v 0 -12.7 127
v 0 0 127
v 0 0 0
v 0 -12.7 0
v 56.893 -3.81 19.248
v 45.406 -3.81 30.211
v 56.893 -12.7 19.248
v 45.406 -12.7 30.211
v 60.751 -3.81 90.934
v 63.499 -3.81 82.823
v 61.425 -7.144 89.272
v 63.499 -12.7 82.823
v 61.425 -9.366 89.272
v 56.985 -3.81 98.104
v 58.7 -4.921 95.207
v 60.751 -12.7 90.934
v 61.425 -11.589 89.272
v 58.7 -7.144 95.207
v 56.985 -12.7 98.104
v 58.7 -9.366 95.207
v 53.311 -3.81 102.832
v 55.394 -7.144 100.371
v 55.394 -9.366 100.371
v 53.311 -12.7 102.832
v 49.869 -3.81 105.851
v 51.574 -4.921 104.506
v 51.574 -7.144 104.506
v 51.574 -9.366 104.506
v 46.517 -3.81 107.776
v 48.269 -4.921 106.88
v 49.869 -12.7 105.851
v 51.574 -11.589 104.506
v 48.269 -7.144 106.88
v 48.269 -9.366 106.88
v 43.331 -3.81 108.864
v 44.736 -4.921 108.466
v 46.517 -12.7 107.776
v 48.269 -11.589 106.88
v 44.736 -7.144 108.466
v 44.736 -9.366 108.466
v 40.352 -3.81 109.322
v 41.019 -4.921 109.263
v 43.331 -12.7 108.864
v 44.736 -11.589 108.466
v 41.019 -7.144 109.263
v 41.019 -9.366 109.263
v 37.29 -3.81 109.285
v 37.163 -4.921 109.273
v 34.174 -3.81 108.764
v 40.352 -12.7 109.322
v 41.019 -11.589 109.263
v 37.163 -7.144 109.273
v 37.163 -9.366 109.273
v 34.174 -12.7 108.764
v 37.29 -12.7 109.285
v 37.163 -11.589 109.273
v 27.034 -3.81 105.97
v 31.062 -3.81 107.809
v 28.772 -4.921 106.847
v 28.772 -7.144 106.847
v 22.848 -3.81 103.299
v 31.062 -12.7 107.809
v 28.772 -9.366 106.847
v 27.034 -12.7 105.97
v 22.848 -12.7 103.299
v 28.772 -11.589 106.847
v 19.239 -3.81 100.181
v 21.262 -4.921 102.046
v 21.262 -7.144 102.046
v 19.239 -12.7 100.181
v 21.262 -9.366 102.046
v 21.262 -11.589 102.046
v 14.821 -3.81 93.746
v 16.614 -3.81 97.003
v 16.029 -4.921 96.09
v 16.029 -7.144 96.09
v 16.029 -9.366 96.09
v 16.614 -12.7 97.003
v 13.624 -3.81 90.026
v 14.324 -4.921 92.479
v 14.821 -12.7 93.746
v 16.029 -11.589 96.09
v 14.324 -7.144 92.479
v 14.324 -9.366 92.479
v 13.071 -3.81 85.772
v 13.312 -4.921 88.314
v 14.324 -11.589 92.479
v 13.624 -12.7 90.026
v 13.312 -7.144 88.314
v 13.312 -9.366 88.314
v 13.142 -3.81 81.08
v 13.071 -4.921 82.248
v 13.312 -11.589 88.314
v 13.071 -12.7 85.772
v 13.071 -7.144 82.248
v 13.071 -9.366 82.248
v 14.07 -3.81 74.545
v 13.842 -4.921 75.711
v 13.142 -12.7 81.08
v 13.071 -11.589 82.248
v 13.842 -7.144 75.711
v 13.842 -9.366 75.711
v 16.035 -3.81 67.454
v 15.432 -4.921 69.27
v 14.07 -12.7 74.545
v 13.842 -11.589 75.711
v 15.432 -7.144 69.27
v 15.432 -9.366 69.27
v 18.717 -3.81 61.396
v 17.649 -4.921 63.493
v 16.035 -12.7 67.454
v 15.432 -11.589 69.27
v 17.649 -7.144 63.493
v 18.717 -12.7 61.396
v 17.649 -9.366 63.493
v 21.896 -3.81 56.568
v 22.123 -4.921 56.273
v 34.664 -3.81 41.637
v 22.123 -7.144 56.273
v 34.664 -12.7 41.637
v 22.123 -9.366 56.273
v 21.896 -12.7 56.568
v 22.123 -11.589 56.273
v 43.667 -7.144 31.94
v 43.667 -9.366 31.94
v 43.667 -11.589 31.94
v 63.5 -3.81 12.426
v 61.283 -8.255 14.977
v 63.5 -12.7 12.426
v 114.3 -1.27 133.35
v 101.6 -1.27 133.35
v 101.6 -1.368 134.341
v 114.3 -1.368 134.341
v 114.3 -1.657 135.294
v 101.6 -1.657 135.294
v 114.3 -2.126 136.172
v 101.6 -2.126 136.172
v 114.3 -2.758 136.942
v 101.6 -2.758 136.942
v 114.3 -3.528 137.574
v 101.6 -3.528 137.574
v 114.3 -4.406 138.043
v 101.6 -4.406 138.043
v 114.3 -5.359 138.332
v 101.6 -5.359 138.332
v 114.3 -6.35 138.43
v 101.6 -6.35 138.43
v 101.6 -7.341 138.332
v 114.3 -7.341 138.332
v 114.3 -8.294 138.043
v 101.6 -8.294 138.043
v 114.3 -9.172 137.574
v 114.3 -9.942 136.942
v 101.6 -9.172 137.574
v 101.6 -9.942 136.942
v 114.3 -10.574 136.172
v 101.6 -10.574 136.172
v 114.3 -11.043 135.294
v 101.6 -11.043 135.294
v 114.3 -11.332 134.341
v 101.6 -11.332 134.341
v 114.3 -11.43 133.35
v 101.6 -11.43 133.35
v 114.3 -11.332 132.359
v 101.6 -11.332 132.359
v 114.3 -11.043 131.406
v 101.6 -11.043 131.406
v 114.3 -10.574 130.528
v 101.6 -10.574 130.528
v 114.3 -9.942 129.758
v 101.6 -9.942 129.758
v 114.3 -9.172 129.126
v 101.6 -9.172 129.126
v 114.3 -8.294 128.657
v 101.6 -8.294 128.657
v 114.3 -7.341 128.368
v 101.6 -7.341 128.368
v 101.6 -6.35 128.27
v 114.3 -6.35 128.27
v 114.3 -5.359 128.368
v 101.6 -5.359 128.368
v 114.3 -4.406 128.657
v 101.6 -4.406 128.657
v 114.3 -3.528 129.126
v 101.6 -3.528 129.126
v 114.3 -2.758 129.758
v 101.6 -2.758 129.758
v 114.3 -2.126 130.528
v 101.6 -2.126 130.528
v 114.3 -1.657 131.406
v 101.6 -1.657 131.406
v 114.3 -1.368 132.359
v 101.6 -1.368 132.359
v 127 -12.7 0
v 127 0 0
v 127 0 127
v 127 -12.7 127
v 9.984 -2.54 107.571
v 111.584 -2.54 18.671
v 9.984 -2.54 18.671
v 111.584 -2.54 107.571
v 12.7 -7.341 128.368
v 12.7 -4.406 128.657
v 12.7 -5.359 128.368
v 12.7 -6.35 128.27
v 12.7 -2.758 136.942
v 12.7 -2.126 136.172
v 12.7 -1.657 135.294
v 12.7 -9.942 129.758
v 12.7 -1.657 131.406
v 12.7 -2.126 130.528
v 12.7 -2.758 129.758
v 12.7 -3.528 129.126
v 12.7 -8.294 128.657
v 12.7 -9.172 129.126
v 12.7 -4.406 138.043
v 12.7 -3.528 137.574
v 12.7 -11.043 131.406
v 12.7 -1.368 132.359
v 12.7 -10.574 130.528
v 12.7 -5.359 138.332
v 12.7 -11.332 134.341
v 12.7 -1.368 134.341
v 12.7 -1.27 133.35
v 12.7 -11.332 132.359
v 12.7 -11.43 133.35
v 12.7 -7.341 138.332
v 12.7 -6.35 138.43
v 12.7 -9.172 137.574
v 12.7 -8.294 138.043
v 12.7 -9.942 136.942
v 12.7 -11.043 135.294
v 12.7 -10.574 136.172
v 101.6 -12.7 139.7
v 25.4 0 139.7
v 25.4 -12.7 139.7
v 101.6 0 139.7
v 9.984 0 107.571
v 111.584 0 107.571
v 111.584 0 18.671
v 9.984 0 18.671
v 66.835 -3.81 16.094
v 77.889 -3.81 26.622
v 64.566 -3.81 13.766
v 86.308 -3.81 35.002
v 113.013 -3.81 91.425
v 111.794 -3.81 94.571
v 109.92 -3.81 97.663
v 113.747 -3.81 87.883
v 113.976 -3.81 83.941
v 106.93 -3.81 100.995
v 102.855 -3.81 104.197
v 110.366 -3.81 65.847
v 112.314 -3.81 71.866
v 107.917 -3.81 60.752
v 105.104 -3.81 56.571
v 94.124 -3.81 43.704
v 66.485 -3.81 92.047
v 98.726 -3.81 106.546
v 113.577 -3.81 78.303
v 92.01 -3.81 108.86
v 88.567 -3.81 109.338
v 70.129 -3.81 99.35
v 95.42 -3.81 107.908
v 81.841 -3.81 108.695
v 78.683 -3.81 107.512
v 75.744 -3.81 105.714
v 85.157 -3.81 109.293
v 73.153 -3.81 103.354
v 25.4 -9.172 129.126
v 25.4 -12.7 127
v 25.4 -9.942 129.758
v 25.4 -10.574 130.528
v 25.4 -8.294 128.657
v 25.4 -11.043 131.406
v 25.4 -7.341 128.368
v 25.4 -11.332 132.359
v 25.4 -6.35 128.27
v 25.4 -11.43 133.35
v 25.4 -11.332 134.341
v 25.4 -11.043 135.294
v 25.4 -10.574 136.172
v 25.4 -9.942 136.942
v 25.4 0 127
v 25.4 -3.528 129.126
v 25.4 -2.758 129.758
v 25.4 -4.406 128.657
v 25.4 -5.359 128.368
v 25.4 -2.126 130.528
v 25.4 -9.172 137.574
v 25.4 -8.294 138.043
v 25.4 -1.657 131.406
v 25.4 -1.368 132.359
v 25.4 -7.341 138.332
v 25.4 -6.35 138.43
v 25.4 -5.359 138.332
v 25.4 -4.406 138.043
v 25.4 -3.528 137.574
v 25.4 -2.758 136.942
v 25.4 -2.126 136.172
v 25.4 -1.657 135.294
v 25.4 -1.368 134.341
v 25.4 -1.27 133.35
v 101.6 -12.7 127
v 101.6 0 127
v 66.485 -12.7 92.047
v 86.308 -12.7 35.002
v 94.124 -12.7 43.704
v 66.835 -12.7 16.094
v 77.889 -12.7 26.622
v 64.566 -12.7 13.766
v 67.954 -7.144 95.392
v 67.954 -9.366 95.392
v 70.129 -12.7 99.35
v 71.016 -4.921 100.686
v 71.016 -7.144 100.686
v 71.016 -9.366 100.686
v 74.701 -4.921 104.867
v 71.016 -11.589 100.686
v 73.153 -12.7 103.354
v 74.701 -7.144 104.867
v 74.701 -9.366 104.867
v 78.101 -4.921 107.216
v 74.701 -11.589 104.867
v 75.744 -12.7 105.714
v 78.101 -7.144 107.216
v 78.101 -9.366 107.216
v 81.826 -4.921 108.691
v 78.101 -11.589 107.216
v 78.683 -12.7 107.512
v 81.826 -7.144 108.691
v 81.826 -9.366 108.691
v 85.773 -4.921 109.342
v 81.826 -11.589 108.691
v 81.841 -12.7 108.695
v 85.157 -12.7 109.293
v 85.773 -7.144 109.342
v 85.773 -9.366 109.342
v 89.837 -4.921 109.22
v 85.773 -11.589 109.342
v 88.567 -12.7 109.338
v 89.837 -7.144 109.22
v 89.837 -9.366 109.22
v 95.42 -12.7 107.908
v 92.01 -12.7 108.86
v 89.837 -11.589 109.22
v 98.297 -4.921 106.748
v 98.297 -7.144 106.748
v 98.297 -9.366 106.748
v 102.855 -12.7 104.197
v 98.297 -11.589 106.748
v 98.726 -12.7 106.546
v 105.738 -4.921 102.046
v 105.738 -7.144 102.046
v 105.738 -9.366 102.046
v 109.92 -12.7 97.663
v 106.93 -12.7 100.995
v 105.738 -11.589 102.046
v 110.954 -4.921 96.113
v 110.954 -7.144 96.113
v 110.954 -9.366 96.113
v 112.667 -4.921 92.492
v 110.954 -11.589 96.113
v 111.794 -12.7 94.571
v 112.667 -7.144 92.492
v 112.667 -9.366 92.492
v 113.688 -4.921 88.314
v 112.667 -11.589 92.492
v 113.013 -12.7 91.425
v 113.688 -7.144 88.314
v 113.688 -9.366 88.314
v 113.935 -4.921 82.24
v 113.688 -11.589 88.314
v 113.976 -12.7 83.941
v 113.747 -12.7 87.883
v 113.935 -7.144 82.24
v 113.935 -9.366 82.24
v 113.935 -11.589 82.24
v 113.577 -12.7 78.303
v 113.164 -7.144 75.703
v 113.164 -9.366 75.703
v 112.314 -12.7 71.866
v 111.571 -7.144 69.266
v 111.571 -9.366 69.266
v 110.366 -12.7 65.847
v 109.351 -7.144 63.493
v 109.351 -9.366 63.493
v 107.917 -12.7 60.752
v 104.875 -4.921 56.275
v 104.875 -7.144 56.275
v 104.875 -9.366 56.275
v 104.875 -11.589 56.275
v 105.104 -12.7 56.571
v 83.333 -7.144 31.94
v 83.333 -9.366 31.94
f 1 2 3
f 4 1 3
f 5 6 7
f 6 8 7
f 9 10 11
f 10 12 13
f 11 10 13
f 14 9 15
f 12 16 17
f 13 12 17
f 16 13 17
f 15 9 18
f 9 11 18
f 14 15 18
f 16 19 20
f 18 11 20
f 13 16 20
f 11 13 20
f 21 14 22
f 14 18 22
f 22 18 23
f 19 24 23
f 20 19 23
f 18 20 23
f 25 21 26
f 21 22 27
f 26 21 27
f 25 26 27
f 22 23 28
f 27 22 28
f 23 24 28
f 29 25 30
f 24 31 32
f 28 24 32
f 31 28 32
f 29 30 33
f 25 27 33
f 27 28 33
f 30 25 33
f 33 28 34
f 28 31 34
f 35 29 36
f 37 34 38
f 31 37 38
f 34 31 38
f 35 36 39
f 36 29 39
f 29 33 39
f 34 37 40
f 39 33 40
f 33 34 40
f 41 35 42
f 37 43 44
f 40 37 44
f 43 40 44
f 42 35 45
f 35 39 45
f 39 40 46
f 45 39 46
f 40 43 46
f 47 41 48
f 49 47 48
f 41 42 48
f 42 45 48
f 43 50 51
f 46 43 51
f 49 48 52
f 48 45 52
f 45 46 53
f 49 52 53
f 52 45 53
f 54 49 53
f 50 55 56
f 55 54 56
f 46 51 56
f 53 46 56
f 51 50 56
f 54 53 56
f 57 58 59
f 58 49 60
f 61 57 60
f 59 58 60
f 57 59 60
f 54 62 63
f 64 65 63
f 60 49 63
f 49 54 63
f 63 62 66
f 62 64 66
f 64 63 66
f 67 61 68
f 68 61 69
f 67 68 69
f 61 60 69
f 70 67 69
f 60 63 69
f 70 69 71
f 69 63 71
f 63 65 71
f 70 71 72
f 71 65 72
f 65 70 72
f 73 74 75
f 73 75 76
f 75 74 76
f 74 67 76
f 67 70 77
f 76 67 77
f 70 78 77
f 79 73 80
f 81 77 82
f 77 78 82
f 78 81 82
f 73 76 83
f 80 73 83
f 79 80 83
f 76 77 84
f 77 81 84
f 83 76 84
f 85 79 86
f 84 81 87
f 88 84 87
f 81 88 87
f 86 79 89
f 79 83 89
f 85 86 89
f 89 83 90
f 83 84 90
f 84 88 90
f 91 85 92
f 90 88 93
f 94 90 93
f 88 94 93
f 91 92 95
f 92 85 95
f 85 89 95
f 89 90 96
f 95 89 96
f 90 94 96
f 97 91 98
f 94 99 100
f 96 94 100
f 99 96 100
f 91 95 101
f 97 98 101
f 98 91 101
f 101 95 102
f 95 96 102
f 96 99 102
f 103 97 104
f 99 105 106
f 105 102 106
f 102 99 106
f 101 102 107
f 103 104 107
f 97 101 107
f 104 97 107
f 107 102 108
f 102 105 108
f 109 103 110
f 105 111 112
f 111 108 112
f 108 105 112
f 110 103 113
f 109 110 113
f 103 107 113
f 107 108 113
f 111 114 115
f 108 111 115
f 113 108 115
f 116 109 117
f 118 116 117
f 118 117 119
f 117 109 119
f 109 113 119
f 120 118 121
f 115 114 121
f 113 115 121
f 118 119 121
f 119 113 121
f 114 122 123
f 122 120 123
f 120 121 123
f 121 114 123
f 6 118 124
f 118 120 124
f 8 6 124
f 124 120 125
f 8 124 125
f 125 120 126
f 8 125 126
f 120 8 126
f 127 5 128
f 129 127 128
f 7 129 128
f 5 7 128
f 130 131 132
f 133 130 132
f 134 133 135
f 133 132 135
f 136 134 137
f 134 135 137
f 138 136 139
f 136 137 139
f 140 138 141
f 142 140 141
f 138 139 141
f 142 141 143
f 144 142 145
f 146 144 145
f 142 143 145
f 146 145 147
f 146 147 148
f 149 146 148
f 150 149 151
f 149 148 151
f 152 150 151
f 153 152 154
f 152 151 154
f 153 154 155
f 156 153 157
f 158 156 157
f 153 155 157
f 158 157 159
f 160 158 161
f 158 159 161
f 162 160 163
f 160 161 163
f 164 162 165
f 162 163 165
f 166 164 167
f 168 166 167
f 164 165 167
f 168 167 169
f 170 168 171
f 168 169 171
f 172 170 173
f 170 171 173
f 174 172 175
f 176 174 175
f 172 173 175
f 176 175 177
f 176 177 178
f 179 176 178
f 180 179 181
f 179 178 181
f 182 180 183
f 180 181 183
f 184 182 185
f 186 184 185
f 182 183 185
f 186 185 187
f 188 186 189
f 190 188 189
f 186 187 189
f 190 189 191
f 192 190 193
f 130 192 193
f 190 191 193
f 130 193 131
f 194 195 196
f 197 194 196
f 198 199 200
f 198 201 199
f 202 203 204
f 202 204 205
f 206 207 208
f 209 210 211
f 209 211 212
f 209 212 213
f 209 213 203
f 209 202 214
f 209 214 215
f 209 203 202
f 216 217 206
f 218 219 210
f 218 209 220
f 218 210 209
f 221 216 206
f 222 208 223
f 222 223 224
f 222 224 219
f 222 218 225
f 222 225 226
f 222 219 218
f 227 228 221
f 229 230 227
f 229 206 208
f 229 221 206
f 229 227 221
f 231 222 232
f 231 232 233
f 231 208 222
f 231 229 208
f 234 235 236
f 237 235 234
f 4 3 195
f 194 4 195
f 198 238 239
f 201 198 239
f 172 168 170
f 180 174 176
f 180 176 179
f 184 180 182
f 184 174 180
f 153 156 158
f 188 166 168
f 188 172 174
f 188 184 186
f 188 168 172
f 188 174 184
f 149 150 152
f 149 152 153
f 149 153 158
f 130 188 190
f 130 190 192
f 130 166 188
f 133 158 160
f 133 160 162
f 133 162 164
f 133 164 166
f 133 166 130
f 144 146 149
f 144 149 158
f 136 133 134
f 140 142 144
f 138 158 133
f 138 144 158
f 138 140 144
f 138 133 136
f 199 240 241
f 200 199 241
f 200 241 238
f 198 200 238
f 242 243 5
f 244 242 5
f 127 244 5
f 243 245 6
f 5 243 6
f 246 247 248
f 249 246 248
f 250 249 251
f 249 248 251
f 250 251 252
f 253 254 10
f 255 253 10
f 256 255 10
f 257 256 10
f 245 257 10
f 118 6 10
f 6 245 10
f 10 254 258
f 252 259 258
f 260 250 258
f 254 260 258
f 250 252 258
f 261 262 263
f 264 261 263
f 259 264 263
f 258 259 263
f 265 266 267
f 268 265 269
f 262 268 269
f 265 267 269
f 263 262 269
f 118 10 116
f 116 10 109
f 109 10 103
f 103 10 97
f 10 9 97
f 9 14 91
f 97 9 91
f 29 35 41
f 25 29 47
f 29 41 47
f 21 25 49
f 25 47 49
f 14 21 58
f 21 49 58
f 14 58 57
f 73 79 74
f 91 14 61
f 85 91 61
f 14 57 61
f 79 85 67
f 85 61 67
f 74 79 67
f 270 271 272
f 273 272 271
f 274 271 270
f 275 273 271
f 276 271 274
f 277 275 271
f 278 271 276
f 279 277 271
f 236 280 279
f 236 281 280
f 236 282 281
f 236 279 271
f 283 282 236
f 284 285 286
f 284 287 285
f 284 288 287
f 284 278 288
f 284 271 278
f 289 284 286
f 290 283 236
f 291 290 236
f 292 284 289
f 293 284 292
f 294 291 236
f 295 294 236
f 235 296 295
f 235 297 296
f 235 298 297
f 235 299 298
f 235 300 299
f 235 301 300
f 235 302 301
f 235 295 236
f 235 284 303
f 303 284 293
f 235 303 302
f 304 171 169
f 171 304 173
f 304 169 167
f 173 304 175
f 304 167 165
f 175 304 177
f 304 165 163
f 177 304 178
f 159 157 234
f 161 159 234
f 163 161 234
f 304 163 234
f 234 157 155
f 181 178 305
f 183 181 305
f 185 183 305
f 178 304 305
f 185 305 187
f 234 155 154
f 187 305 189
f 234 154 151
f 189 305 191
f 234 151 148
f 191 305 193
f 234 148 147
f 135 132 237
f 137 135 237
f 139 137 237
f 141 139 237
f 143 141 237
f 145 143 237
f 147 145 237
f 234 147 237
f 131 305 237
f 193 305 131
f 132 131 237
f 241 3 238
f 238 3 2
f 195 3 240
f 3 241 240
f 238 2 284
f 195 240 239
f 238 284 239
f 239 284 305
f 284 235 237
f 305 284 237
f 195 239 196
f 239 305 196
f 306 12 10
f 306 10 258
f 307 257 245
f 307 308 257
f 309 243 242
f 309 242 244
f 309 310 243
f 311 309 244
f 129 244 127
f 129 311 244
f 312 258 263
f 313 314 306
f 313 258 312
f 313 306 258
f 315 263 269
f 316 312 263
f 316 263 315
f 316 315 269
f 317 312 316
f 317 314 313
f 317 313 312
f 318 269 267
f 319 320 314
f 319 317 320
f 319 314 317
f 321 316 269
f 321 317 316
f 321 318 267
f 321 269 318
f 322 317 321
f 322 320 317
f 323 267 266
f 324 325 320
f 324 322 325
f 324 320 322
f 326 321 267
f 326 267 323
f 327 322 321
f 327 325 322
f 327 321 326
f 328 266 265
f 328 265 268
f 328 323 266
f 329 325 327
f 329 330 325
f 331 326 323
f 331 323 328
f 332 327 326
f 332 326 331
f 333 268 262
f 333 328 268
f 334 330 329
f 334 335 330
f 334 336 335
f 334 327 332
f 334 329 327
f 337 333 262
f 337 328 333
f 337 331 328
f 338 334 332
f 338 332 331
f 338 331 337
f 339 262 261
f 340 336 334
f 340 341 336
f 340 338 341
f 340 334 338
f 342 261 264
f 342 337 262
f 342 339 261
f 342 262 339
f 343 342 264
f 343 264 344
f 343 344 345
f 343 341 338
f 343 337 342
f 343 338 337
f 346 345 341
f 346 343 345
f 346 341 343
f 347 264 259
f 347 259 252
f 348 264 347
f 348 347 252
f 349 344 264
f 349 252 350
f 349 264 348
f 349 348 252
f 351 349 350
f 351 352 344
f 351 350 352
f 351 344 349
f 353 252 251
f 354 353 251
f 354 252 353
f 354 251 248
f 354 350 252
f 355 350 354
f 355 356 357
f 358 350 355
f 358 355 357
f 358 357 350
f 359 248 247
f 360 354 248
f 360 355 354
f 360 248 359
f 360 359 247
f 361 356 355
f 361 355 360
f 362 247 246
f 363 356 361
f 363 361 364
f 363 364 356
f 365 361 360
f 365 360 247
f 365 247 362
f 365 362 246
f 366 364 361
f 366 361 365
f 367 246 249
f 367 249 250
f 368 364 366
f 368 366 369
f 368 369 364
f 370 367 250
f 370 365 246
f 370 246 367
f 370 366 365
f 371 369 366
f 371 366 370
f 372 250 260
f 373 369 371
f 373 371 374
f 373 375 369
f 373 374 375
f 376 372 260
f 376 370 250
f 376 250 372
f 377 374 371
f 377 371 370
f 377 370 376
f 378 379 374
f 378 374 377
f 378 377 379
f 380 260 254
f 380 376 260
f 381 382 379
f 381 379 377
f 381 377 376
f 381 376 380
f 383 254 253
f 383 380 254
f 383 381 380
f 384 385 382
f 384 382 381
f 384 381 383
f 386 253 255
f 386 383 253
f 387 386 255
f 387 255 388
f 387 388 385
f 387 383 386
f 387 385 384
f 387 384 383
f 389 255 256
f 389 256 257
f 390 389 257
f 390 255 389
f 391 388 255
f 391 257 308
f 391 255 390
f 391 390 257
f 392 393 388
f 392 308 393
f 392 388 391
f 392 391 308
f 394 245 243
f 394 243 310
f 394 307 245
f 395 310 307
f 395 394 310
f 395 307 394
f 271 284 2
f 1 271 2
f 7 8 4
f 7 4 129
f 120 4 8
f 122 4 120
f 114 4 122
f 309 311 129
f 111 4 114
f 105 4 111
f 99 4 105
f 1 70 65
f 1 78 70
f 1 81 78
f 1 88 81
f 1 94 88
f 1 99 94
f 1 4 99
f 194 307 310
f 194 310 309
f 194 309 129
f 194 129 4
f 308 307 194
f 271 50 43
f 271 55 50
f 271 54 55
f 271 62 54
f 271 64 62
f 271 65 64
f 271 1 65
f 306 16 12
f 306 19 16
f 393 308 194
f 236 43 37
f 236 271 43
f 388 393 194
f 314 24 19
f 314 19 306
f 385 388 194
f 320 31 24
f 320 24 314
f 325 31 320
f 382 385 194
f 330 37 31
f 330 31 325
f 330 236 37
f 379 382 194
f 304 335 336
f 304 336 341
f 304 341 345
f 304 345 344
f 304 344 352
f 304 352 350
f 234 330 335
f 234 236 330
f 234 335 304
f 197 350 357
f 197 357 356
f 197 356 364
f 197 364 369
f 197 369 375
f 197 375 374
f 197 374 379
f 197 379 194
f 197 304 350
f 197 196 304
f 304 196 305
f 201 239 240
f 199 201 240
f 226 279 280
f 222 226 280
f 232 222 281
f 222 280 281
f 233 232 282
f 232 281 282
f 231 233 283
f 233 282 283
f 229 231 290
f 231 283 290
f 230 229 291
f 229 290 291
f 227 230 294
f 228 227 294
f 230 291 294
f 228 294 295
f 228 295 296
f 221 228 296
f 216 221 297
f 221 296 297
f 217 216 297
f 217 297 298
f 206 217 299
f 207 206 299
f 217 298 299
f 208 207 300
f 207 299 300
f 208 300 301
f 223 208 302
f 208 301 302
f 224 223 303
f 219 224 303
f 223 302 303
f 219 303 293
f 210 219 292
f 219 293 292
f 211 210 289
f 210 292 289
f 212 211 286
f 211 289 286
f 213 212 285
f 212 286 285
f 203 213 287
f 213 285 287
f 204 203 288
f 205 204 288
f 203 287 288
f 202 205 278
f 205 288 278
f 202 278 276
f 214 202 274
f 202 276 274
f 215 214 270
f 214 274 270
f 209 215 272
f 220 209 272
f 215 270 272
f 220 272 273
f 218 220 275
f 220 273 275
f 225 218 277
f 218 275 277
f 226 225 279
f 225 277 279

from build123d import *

# Parameters (mm, degrees)
F0_W      = 76.2
F0_H      = 12.7
F1_DEPTH  = 12.7
F3_DEPTH  = 8.89
F4_R      = 5.08
F6_DEPTH  = 12.7
F5_R      = 5.08
F7_DEPTH  = 12.7
F9_DEPTH  = 25.4
F10_DEPTH = 27.94


with BuildPart() as f1:
    # F0 (on Front) → F1 (new body)
    with BuildSketch(Plane.XZ):
        Polygon((0, 127), (0, 0), (127, 0), (127, 127), (101.6, 127), (25.4, 127), align=None)
        with Locations((63.5, 133.35)):
            Rectangle(F0_W, F0_H)
    extrude(amount=F1_DEPTH)

    # F2 (on face) → F3 (cut)
    with BuildSketch(Plane.XZ.offset(12.7)):
        with BuildLine():
            add(Edge.make_bspline(
                [(63.4987656228, 82.8234252413), (65.7944586236, 91.6299622391), (72.1886023506, 107.0116522323), (90.0821587433, 111.2125565685), (106.8710029159, 103.0162659913), (116.4791124343, 88.9318796455), (110.9170075822, 62.2019240555), (99.1217465906, 50.0178945927), (85.713732663, 33.0522997276), (64.6725747122, 14.5310603816), (63.5000403166, 12.4261625143)],
                knots=[0, 0, 0, 0, 0.1334920413, 0.2400309268, 0.3521533097, 0.4590894201, 0.5938444531, 0.7025908162, 0.8355735517, 0.9771775563, 0.9771775563, 0.9771775563, 0.9771775563], degree=3))
            add(Edge.make_bspline(
                [(63.4987656228, 82.8234252413), (61.1980108587, 91.6493797334), (53.6750071574, 106.1699961718), (37.05564123, 111.4877343311), (20.0712763985, 102.9357168424), (10.5413805272, 88.9603425755), (16.0783040671, 62.1954127389), (27.8800231479, 50.019785903), (41.2846350113, 33.0521653502), (62.3303330397, 14.5298536586), (63.5000403166, 12.4261625143)],
                knots=[0, 0, 0, 0, 0.1337863773, 0.2385689745, 0.3509673467, 0.4580992197, 0.5931009421, 0.7020463819, 0.8352725623, 0.9771357943, 0.9771357943, 0.9771357943, 0.9771357943], degree=3))
        make_face()
    extrude(amount=-F3_DEPTH, mode=Mode.SUBTRACT)

    # F4 (on face) → F6 (join)
    with BuildSketch(Plane(origin=(25.4, 0, 0), x_dir=(0, -1, 0), z_dir=(-1, 0, 0))):
        with Locations((6.35, 133.35)):
            Circle(F4_R)
    extrude(amount=F6_DEPTH)

    # F5 (on face) → F7 (join)
    with BuildSketch(Plane.YZ.offset(101.6)):
        with Locations((-6.35, 133.35)):
            Circle(F5_R)
    extrude(amount=F7_DEPTH)

    # F8 (on face) → F9 (join)
    with BuildSketch(Plane(origin=(0, 0, 0), x_dir=(-1, 0, 0), z_dir=(0, 1, 0))):
        Polygon((-111.5843430161, 18.6714399606), (-63.5, 18.6714399606), (-9.9843430161, 18.6714399606), (-9.9843430161, 50.8), (-9.9843430161, 63.5), (-9.9843430161, 107.5714399606), (-63.5, 107.5714399606), (-111.5843430161, 107.5714399606), (-111.5843430161, 63.5), (-111.5843430161, 50.8), align=None)
    extrude(amount=F9_DEPTH)

    # F10 (cut): a face of the model
    f10_faces = [f1.faces().sort_by_distance(p)[0] for p in [
        (60.7843430161, 25.4, 63.1214399606),
    ]]
    extrude(f10_faces, amount=-F10_DEPTH, mode=Mode.SUBTRACT)


solid = f1.part
